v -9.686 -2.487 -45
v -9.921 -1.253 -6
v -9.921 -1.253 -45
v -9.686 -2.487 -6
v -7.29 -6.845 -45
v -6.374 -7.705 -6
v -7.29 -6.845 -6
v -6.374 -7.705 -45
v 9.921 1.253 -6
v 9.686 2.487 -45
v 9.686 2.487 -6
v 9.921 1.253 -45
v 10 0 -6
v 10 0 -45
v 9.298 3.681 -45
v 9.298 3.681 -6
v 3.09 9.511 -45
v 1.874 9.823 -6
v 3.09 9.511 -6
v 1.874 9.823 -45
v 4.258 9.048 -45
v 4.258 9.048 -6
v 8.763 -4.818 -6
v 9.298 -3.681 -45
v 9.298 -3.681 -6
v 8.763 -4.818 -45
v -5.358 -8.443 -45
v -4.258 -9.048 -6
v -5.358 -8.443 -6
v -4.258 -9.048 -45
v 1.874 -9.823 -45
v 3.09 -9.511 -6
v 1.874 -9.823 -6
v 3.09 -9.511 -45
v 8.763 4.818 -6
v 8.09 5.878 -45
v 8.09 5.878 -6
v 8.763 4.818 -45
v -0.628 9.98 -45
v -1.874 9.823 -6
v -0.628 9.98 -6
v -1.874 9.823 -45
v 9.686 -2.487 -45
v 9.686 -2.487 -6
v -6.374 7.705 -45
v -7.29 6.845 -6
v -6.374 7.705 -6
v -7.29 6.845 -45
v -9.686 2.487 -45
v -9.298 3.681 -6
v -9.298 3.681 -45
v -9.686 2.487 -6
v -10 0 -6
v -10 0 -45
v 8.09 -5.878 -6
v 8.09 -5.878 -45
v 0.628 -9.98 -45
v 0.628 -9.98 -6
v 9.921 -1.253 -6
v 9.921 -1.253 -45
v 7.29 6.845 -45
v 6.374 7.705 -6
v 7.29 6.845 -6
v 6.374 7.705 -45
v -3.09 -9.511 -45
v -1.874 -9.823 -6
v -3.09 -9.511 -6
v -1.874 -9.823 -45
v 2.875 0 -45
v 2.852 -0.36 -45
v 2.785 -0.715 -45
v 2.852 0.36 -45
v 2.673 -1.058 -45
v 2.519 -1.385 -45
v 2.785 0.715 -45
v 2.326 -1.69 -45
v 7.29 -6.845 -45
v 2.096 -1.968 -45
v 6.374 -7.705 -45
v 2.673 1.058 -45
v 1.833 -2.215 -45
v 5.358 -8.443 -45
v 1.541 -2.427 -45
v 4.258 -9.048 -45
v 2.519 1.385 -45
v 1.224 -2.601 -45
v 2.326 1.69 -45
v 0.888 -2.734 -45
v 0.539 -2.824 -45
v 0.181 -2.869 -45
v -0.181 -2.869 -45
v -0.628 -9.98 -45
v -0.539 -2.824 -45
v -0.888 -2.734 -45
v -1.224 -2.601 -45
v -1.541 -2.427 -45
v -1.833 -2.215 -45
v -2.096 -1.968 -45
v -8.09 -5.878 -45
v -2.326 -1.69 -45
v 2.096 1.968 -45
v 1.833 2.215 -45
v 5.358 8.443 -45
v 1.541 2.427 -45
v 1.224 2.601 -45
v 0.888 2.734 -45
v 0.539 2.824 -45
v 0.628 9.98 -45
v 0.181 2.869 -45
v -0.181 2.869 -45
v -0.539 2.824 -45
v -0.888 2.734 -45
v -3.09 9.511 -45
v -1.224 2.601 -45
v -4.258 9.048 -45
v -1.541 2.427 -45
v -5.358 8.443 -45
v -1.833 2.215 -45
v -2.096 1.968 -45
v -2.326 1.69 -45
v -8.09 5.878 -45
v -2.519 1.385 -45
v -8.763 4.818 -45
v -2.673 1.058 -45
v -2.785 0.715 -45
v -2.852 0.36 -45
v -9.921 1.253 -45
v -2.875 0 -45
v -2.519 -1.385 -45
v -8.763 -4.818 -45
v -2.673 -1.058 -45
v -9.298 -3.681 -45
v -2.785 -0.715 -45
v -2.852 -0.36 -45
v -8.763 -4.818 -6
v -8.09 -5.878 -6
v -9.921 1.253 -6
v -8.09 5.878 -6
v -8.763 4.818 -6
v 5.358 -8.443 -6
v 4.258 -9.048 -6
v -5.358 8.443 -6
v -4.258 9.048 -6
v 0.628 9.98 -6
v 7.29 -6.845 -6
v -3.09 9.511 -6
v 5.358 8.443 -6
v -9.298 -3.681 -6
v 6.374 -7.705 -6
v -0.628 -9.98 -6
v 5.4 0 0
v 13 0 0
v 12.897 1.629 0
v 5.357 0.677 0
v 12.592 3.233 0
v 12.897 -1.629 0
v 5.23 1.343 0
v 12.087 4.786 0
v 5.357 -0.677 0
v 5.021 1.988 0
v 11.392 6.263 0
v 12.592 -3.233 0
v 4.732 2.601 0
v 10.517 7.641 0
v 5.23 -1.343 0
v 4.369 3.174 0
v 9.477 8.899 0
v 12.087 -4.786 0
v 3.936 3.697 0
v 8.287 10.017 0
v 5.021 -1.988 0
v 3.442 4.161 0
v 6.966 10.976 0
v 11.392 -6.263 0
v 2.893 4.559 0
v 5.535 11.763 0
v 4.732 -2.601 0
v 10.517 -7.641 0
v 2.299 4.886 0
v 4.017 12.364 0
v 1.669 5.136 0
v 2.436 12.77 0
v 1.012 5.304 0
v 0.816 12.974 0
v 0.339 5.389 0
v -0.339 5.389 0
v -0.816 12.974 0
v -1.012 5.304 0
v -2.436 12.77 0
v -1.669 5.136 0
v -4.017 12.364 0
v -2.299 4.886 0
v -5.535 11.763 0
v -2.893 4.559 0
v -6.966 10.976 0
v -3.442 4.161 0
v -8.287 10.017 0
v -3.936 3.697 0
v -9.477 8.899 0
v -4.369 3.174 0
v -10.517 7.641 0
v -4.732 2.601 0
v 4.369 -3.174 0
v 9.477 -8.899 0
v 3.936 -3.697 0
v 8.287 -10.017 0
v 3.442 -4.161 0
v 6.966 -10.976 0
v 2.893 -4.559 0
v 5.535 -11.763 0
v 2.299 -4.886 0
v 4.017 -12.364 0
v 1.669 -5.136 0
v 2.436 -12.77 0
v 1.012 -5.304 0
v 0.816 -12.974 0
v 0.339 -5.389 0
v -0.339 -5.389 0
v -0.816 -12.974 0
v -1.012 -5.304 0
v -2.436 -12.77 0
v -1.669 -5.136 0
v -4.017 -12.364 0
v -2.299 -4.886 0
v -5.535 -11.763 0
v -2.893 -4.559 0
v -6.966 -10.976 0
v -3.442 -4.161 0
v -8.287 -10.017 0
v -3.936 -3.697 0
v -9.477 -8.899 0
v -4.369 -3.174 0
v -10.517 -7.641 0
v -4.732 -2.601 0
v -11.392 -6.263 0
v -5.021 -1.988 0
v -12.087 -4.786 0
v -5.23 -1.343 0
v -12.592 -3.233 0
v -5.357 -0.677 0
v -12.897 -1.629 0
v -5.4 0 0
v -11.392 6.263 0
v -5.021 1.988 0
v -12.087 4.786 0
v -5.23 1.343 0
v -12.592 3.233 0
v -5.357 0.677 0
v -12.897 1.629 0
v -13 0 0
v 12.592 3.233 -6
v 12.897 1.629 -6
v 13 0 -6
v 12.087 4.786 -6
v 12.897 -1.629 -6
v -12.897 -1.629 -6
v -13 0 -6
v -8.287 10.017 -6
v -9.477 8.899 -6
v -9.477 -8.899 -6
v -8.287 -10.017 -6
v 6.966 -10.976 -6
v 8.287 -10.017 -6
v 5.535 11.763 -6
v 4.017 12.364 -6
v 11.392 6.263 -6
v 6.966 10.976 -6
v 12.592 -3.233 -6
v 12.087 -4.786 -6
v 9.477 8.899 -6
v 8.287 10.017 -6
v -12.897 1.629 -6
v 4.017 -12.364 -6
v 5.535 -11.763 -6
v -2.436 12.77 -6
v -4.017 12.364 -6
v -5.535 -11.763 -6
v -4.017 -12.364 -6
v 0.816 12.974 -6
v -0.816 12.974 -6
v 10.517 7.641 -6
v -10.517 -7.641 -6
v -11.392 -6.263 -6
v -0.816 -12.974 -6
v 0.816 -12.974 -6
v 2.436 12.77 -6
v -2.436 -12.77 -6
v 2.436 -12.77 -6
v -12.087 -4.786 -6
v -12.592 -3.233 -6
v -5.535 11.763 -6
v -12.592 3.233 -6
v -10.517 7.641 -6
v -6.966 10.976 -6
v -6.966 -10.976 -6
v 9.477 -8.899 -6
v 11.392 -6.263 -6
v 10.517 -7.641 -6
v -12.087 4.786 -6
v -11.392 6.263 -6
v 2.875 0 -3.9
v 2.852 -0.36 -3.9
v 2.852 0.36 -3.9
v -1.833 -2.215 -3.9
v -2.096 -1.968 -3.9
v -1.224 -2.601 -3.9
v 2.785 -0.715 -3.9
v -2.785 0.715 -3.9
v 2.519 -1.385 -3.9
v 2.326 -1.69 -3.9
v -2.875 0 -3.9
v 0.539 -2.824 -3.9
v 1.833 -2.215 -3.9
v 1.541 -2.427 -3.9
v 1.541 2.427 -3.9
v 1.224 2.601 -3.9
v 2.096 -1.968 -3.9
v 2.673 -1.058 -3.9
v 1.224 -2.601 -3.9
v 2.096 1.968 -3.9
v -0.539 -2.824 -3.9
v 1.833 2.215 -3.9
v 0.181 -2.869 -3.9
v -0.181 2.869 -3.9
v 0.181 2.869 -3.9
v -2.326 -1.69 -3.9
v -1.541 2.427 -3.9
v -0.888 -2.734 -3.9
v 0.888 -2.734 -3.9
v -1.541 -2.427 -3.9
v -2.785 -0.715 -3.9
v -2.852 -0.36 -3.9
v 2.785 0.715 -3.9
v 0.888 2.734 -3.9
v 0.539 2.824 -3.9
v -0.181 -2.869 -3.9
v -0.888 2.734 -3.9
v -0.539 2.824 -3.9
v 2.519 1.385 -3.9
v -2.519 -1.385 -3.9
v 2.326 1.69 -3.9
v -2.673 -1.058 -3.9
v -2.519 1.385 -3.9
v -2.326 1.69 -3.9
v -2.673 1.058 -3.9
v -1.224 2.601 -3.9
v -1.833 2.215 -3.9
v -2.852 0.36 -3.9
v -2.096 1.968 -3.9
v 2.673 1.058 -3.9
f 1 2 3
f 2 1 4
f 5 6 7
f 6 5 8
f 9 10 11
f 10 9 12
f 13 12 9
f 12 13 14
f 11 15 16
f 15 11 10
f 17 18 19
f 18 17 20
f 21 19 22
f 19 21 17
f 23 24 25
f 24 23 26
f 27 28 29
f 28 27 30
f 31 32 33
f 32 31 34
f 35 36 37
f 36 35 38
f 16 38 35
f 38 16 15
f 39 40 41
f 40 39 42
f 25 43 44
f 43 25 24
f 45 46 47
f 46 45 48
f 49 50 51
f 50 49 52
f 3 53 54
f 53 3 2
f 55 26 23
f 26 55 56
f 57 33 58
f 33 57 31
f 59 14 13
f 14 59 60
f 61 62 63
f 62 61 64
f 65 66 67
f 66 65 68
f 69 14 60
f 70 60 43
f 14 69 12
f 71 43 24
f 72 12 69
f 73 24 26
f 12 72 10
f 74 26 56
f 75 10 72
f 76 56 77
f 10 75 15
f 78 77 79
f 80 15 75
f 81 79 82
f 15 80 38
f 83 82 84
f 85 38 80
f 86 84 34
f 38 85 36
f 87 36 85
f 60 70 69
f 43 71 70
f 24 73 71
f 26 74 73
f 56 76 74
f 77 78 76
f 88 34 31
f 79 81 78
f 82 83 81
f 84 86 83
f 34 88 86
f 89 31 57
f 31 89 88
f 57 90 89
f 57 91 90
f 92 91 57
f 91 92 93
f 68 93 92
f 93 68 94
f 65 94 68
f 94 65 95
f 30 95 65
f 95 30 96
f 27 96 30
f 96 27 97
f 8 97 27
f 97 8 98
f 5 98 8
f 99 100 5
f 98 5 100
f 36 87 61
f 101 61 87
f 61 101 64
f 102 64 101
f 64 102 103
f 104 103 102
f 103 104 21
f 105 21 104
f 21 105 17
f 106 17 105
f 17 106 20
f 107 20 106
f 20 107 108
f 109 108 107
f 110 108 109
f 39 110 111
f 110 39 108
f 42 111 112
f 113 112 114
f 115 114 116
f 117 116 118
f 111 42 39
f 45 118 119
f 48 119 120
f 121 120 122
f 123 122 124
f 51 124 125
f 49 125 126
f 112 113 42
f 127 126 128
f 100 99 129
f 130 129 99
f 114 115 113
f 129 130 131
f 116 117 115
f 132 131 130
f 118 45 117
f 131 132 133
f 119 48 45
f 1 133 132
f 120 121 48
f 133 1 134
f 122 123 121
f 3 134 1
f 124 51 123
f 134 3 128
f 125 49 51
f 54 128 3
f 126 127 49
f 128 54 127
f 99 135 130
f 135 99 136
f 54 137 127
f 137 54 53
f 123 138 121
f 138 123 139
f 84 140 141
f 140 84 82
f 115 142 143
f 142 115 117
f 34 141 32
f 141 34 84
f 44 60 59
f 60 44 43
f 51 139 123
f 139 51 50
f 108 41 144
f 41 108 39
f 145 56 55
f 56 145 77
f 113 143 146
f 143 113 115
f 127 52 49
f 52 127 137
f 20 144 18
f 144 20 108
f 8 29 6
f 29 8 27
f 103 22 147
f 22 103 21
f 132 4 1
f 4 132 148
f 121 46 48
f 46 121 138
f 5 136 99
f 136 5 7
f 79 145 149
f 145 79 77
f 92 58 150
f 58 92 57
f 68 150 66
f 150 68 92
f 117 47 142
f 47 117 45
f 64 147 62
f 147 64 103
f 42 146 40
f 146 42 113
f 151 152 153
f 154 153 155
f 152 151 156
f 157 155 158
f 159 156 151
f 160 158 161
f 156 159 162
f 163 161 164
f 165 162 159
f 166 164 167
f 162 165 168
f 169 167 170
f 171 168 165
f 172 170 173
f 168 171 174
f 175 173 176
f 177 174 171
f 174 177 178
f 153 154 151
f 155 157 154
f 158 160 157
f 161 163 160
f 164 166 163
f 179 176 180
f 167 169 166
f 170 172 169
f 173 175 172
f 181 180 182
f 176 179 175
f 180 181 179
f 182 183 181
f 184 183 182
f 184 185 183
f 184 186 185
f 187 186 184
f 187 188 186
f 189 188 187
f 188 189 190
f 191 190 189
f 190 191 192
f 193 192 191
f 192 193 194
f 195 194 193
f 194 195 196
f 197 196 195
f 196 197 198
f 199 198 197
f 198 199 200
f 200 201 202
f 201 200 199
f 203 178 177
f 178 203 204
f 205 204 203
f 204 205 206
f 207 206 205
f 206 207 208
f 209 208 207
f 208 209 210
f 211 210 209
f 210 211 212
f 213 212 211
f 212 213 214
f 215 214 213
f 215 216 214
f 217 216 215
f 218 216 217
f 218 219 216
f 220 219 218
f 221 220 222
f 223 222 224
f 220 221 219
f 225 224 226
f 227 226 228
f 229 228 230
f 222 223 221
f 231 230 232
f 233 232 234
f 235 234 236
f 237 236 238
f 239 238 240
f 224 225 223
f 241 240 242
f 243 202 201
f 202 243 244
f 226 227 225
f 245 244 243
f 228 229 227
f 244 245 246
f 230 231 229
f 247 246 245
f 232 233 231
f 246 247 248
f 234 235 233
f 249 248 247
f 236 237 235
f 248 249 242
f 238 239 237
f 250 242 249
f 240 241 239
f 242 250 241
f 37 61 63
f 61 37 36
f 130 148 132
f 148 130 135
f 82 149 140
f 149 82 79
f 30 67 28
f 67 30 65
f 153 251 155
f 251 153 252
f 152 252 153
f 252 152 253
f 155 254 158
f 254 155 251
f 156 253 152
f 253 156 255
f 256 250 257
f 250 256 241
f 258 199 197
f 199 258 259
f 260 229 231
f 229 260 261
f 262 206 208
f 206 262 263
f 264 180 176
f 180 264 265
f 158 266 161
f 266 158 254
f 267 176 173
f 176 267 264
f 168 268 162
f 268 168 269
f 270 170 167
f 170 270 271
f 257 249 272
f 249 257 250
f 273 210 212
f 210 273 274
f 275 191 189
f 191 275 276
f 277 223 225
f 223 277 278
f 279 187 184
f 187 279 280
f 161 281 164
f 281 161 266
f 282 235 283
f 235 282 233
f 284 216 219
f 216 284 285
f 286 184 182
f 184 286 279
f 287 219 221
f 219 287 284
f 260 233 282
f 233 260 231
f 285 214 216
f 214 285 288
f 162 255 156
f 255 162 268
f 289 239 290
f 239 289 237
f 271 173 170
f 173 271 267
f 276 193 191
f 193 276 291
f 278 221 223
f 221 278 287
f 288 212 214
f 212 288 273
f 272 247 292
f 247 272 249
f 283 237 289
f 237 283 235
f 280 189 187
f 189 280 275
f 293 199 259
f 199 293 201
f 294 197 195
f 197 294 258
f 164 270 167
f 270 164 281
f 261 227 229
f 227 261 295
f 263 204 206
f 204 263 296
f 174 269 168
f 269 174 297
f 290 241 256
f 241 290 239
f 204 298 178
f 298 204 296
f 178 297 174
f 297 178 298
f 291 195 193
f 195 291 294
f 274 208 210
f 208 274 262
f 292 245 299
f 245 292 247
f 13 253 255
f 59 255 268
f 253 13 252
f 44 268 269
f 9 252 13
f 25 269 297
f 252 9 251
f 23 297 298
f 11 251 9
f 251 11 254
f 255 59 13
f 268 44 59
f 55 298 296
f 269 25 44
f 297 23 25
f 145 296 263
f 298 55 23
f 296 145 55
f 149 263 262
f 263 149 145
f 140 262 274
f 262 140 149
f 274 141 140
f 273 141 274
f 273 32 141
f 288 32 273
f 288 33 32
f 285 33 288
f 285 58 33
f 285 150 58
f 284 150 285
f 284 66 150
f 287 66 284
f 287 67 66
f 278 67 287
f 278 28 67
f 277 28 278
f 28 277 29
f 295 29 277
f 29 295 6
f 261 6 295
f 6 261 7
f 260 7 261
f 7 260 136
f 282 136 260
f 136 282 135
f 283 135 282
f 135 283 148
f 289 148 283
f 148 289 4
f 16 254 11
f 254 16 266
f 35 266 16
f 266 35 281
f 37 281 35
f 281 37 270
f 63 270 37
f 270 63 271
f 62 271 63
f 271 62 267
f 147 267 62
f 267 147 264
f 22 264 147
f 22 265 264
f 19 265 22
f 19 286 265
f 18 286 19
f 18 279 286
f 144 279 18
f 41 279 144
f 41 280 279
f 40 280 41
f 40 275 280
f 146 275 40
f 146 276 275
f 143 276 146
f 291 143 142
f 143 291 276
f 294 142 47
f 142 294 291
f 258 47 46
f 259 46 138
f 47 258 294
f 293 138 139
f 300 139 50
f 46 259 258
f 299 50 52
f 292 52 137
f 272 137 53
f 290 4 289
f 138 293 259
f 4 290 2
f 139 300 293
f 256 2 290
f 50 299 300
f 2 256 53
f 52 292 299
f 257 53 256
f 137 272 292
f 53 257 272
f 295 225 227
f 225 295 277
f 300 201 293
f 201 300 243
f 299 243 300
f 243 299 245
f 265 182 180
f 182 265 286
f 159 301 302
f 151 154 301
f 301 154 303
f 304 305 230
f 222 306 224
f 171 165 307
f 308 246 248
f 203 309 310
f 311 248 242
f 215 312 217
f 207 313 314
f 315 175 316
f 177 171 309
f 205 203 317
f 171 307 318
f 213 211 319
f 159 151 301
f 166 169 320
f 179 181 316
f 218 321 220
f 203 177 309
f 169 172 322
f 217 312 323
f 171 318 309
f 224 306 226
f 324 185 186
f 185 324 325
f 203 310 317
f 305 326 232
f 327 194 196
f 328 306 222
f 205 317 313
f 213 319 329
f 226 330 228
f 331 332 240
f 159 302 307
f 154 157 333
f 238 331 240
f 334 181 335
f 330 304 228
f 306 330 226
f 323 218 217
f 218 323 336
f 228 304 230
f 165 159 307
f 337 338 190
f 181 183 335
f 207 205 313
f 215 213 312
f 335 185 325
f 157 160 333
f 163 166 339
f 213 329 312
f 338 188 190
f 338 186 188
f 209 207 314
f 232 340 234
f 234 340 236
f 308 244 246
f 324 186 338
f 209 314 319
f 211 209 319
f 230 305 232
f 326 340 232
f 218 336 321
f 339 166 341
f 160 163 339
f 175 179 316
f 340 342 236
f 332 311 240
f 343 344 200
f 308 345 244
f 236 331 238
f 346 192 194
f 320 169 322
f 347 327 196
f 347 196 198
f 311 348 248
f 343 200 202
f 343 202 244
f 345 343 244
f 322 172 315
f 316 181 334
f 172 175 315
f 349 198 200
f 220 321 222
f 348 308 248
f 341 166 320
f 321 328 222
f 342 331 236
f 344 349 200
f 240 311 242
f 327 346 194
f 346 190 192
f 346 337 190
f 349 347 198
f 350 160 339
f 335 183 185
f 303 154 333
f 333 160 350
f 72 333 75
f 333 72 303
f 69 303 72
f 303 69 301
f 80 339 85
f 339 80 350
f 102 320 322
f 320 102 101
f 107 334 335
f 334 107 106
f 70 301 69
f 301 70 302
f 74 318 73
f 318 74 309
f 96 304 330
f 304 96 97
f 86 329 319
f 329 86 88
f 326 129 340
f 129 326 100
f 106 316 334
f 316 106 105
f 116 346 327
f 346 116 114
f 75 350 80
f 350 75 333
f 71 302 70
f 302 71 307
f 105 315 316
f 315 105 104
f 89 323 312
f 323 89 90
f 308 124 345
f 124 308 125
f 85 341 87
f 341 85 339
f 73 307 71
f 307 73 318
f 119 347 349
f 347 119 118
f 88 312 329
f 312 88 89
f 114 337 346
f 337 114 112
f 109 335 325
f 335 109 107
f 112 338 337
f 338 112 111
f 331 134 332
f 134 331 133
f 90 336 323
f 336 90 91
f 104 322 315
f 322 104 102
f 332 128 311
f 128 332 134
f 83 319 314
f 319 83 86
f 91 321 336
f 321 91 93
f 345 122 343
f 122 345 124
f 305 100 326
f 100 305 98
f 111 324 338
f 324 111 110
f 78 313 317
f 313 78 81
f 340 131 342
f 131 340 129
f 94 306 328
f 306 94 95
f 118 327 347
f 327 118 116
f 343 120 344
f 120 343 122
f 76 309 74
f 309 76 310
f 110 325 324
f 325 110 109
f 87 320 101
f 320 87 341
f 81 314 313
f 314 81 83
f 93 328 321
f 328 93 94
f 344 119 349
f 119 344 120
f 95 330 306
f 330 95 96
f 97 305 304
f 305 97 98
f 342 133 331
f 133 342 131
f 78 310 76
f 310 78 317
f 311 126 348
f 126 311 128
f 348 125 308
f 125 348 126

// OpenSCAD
$fn = 50;


difference() {
	union() {
		translate(v = [0, 0, -45.0000000000]) {
			cylinder(h = 45, r = 10.0000000000);
		}
		translate(v = [0, 0, -6.0000000000]) {
			cylinder(h = 6, r = 13.0000000000);
		}
	}
	union() {
		translate(v = [0, 0, 0]) {
			rotate(a = [0, 0, 0]) {
				difference() {
					union() {
						#translate(v = [0, 0, -45.0000000000]) {
							cylinder(h = 45, r = 2.6000000000);
						}
						#translate(v = [0, 0, -3.9000000000]) {
							cylinder(h = 3.9000000000, r = 10.0000000000, r1 = 2.8750000000, r2 = 5.4000000000);
						}
						#translate(v = [0, 0, -45.0000000000]) {
							cylinder(h = 45, r = 2.8750000000);
						}
						#translate(v = [0, 0, -45.0000000000]) {
							cylinder(h = 45, r = 2.6000000000);
						}
					}
					union();
				}
			}
		}
	}
}
